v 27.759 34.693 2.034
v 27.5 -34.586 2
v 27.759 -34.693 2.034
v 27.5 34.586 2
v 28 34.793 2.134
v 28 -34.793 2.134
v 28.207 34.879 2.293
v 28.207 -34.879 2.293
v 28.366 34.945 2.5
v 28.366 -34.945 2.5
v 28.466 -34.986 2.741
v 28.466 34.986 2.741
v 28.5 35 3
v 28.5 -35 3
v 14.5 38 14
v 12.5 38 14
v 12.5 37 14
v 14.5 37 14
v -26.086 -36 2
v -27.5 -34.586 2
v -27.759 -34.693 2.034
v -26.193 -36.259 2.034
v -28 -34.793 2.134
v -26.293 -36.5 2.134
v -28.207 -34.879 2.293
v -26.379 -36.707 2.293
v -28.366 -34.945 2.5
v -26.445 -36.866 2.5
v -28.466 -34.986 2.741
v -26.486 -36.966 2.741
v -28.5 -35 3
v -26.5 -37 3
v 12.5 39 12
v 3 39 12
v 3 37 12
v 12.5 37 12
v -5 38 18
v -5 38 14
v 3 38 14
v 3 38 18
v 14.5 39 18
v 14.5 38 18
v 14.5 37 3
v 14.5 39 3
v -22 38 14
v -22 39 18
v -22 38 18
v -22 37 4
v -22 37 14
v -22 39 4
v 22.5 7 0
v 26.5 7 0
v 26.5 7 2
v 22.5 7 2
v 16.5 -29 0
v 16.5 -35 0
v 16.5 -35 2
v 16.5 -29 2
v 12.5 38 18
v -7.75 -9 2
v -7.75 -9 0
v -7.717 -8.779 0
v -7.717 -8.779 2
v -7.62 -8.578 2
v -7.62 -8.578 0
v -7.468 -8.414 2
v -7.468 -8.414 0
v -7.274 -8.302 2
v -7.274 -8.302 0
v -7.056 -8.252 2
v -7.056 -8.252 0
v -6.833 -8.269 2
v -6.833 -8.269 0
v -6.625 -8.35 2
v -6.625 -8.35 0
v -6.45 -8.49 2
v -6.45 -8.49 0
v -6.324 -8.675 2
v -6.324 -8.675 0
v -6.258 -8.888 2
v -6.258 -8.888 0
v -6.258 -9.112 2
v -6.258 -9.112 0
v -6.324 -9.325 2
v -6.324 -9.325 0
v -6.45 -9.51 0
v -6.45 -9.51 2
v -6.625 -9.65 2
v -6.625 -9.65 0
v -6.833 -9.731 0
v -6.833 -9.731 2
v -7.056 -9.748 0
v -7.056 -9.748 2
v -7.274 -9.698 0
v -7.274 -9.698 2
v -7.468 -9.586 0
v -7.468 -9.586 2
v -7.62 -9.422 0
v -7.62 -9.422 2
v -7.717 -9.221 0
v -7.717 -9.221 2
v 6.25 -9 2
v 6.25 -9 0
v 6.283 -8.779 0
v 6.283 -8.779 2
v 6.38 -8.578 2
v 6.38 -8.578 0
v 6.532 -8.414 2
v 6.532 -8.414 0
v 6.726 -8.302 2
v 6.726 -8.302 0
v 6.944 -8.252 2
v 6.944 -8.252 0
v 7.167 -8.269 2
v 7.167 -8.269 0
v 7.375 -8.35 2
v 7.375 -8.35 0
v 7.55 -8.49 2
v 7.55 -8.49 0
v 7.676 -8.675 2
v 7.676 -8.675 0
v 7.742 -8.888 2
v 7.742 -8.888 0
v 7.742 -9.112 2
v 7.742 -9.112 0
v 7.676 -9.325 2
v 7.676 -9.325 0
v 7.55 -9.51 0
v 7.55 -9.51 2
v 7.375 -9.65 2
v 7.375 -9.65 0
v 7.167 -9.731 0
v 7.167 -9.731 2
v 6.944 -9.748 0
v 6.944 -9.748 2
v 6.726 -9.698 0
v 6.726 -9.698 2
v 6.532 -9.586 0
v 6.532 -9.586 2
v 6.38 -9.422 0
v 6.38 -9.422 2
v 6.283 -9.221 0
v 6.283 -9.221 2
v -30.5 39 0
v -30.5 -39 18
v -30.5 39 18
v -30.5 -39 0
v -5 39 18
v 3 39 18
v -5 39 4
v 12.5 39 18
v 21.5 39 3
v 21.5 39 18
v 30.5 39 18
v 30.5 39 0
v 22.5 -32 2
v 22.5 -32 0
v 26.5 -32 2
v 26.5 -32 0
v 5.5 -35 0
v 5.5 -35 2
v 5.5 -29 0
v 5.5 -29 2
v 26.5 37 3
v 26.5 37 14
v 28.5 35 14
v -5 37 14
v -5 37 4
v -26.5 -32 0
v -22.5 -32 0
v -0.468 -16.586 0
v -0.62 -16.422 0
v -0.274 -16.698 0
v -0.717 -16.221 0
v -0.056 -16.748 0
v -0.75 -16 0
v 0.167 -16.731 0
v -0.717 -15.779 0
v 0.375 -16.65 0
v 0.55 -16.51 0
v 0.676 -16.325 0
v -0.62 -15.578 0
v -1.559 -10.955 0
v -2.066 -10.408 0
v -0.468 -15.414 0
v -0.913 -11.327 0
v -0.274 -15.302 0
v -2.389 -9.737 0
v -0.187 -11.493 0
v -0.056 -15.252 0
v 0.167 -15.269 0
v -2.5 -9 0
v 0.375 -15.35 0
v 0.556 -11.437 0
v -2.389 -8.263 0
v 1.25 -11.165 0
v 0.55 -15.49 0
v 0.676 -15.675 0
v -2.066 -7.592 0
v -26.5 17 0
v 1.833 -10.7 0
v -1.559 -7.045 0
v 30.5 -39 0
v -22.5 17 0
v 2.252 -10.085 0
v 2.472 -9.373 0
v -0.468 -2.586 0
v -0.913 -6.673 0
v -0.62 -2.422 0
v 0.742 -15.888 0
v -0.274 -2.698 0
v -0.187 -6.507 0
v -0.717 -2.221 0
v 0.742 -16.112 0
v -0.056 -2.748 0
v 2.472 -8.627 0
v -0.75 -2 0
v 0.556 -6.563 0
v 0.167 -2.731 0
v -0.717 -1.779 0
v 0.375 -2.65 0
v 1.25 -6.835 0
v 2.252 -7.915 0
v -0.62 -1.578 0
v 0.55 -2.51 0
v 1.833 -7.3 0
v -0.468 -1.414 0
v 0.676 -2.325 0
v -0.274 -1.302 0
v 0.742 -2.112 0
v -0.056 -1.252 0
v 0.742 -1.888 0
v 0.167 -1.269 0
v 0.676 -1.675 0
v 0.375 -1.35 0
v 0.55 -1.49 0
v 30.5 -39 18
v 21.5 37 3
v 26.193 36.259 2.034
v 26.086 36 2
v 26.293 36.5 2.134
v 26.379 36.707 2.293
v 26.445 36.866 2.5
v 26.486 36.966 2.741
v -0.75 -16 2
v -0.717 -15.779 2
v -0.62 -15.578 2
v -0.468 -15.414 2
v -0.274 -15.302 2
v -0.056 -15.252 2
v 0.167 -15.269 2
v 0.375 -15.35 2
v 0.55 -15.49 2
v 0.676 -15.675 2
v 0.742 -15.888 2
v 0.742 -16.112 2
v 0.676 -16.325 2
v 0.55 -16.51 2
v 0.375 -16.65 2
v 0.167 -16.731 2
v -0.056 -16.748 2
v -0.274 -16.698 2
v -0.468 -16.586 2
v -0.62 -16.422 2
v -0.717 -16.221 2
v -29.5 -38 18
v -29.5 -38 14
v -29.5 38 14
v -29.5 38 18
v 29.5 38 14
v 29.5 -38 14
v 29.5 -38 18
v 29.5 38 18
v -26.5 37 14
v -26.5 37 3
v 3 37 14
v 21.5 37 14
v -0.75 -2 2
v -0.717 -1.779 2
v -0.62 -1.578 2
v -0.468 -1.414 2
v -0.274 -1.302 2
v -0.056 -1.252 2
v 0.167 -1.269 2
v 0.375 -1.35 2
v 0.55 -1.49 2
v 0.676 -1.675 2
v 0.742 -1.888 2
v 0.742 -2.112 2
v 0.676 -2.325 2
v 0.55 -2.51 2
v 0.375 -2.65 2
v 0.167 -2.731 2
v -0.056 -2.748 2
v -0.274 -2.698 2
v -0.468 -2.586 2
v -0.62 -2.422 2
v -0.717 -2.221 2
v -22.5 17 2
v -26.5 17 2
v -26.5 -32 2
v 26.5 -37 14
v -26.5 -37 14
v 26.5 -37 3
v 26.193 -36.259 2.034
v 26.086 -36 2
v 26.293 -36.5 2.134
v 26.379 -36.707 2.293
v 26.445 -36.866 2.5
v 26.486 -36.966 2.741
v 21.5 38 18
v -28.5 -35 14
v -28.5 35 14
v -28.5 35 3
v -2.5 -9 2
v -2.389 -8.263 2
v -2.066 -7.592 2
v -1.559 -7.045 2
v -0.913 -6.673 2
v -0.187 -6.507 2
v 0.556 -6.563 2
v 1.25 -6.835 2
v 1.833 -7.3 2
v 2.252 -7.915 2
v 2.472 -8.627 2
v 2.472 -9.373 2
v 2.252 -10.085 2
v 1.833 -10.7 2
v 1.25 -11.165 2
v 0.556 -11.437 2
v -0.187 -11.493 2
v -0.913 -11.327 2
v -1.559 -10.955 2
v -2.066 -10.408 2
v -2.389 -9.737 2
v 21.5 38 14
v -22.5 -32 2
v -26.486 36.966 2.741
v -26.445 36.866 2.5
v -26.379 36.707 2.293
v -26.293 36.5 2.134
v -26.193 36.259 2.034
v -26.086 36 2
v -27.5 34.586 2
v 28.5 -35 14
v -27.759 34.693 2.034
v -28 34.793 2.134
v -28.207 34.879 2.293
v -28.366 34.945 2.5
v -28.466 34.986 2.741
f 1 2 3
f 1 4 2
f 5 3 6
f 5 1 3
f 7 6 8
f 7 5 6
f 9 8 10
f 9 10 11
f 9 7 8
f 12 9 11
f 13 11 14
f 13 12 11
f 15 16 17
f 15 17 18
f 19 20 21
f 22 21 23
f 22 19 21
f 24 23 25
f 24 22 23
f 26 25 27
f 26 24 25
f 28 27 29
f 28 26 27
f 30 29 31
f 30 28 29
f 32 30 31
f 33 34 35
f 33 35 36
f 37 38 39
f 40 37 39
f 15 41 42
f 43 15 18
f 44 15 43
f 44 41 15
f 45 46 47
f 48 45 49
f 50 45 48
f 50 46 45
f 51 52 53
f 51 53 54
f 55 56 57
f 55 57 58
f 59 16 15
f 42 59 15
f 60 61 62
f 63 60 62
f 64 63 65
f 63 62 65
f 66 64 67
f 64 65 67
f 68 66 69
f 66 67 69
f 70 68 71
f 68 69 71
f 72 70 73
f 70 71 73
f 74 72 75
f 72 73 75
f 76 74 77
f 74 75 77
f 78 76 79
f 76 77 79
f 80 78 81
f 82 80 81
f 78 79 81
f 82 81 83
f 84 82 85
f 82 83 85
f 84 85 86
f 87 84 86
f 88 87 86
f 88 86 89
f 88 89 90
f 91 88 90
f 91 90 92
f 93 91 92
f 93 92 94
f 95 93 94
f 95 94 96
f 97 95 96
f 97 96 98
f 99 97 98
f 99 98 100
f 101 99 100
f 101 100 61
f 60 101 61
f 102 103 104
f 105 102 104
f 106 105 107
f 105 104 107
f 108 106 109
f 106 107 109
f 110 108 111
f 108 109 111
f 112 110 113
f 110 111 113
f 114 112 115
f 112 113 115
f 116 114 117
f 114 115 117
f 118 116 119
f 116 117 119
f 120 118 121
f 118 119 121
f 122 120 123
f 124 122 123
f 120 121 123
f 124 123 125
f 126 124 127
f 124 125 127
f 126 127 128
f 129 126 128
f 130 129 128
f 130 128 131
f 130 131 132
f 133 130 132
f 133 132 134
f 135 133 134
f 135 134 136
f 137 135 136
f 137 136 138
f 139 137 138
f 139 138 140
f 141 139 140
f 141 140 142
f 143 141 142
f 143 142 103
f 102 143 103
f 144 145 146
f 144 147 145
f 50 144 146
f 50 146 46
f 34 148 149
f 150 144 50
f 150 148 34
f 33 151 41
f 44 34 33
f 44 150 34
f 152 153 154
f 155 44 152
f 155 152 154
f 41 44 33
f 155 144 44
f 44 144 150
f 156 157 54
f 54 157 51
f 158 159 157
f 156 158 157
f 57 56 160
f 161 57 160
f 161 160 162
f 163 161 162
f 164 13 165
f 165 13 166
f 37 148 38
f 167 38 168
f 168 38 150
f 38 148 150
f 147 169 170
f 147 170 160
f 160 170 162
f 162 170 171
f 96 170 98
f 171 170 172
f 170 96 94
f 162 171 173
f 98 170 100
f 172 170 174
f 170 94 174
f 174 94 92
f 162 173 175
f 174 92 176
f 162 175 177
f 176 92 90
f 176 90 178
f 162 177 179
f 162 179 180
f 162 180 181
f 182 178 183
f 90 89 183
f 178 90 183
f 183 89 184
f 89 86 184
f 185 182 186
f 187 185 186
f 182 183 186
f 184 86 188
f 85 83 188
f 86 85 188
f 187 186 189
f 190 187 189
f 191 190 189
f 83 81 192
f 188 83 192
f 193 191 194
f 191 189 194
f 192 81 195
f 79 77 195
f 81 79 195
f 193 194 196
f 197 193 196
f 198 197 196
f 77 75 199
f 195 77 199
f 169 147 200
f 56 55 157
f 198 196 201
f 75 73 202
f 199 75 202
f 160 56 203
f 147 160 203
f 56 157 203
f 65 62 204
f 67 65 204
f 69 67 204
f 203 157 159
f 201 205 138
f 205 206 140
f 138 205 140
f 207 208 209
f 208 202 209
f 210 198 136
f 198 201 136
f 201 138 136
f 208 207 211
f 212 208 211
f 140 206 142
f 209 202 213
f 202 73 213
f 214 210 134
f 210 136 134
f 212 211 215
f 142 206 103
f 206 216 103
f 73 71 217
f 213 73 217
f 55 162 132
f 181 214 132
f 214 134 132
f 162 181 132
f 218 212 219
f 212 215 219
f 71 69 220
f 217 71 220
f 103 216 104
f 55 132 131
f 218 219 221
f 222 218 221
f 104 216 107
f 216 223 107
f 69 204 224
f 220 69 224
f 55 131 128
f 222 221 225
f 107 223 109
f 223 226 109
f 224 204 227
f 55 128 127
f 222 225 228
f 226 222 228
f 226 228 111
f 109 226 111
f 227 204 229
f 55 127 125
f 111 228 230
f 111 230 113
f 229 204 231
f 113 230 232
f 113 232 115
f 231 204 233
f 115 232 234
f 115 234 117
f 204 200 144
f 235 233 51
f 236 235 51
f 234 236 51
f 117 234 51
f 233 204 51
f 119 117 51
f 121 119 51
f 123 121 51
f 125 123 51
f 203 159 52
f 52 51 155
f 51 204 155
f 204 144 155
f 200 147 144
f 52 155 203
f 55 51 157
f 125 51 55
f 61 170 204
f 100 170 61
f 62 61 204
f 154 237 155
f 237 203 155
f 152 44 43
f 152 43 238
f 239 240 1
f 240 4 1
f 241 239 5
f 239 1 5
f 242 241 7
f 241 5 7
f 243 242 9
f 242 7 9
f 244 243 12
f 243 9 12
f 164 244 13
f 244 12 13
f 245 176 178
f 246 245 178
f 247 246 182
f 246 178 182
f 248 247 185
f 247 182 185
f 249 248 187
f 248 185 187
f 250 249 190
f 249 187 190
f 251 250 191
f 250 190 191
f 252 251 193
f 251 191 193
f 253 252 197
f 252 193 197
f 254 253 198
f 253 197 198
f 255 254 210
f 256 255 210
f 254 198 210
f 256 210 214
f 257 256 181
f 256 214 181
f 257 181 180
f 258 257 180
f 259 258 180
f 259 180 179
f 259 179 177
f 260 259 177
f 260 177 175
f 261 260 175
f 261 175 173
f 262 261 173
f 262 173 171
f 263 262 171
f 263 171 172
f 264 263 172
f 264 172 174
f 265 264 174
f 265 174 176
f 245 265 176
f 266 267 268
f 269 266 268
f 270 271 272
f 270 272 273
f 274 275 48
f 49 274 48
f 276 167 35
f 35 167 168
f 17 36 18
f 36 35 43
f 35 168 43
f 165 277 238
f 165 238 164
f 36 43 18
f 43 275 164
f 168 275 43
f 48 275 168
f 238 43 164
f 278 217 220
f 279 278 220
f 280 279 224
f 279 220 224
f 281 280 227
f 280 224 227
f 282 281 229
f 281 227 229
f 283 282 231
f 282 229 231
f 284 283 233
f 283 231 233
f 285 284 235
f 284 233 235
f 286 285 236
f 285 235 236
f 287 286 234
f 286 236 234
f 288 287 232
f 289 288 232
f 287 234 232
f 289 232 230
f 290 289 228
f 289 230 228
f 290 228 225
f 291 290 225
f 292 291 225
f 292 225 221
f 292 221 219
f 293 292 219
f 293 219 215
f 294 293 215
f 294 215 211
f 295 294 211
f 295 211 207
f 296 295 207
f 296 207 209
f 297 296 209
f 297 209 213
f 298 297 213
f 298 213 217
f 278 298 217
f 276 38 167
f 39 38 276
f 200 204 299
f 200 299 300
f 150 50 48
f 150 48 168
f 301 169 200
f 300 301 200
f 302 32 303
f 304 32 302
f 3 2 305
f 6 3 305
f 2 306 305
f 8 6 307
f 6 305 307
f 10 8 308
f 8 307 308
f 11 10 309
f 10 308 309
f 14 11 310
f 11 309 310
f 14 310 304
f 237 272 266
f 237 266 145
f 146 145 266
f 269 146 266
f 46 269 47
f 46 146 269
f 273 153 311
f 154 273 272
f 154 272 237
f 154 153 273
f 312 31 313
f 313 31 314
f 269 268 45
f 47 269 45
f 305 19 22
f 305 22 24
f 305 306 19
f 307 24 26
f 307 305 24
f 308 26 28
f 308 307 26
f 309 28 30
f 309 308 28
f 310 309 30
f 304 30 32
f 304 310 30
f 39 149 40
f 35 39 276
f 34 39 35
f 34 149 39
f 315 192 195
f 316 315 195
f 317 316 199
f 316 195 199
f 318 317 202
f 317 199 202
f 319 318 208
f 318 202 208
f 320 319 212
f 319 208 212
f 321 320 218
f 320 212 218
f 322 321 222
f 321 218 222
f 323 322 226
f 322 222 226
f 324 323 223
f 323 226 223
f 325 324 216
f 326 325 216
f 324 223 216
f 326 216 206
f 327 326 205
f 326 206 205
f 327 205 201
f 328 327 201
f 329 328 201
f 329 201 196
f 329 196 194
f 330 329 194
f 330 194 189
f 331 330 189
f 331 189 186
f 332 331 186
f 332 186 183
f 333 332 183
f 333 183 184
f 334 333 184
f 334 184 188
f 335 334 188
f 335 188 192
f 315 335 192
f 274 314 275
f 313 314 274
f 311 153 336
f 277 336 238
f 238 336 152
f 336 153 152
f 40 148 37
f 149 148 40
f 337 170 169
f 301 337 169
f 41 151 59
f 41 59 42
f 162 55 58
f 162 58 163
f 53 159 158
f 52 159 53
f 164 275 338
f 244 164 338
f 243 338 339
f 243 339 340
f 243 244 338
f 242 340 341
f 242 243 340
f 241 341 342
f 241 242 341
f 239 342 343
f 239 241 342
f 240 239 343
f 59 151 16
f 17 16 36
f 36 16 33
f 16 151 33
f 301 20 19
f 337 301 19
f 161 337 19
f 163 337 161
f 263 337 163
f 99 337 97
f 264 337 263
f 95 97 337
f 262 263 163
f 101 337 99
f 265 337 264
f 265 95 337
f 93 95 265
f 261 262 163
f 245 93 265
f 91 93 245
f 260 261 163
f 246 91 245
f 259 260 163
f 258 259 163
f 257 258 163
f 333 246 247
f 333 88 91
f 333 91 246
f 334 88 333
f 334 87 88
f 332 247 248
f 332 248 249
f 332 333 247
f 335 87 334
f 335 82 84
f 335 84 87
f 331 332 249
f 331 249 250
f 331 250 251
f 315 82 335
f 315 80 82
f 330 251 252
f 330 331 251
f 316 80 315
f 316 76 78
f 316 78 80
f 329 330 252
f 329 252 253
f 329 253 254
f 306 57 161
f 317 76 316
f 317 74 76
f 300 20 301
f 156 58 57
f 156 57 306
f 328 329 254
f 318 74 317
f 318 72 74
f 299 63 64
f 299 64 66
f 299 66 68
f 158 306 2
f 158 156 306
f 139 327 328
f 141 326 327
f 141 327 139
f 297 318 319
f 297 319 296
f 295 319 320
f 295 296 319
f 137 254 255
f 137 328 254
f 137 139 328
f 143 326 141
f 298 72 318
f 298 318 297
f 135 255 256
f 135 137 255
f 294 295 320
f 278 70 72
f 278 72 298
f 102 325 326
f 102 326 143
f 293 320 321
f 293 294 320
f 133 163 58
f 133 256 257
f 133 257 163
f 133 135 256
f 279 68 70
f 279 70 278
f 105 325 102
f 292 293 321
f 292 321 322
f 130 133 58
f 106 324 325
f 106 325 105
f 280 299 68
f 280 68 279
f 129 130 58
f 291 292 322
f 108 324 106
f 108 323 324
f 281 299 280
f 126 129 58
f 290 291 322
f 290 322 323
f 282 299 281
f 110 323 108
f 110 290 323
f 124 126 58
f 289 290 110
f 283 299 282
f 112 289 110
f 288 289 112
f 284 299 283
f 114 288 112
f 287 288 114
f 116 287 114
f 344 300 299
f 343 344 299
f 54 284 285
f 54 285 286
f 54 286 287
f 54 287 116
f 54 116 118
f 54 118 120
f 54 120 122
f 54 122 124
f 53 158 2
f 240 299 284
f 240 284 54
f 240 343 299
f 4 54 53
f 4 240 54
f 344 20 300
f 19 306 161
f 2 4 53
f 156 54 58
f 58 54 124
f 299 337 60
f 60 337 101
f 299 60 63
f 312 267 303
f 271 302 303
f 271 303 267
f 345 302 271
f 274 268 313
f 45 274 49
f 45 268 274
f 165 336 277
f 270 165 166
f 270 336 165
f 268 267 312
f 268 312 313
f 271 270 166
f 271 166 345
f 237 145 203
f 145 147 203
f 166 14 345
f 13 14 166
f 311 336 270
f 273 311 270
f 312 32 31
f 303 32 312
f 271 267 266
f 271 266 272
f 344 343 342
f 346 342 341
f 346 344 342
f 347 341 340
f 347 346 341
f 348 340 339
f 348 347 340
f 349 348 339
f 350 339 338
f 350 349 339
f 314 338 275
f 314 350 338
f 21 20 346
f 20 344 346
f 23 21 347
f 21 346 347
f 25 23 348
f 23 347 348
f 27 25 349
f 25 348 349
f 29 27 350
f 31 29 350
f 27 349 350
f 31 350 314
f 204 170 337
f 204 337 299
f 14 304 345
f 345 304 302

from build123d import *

# Parameters (mm, degrees)
ESQUISSE1_W             = 61
ESQUISSE1_H             = 78
BOSS_EXTRU_1_DEPTH      = 2
ESQUISSE2_W             = 61
ESQUISSE2_H             = 78
ESQUISSE2_W_2           = 57
ESQUISSE2_H_2           = 74
BOSS_EXTRU_2_DEPTH      = 12
ESQUISSE3_W             = 61
ESQUISSE3_H             = 78
ESQUISSE3_W_2           = 59
ESQUISSE3_H_2           = 76
BOSS_EXTRU_3_DEPTH      = 4
ESQUISSE7_W             = 17
ESQUISSE7_H             = 20.984875374
ESQUISSE7_W_2           = 7
ESQUISSE7_H_2           = 18.09159362
ESQUISSE7_W_3           = 9.5
ESQUISSE7_H_3           = 11.016430182
ENL_V_MAT_EXTRU_2_DEPTH = 3
ENL_V_MAT_EXTRU_3_REACH = 54.681
ESQUISSE8_W             = 4
ESQUISSE8_H             = 39
ESQUISSE8_H_2           = 49
ESQUISSE8_W_2           = 11
ESQUISSE8_H_3           = 6
CHANFREIN1_SIZE         = 2
ENL_V_MAT_EXTRU_4_REACH = 54.681
ESQUISSE9_R             = 2.5
ESQUISSE9_R_2           = 0.75
CONG_1_R                = 1


with BuildPart() as part:
    # Esquisse1 → Boss.-Extru.1 (new body)
    with BuildSketch(Plane.XY):
        Rectangle(ESQUISSE1_W, ESQUISSE1_H)
    extrude(amount=BOSS_EXTRU_1_DEPTH)

    # Esquisse2 → Boss.-Extru.2 (add)
    with BuildSketch(Plane.XY.offset(2)):
        Rectangle(ESQUISSE2_W, ESQUISSE2_H)
        Rectangle(ESQUISSE2_W_2, ESQUISSE2_H_2, mode=Mode.SUBTRACT)
    extrude(amount=BOSS_EXTRU_2_DEPTH)

    # Esquisse3 → Boss.-Extru.3 (add)
    with BuildSketch(Plane.XY.offset(14)):
        Rectangle(ESQUISSE3_W, ESQUISSE3_H)
        Rectangle(ESQUISSE3_W_2, ESQUISSE3_H_2, mode=Mode.SUBTRACT)
    extrude(amount=BOSS_EXTRU_3_DEPTH)

    # Esquisse7 → Enlèv. mat.-Extru.2 (cut)
    with BuildSketch(Plane(origin=(0, 39, 0), x_dir=(1, 0, 0), z_dir=(0, 1, 0))):
        with Locations((-13.5, -14.492437687)):
            Rectangle(ESQUISSE7_W, ESQUISSE7_H)
        with Locations((18, -12.04579681)):
            Rectangle(ESQUISSE7_W_2, ESQUISSE7_H_2)
        with Locations((7.75, -17.508215091)):
            Rectangle(ESQUISSE7_W_3, ESQUISSE7_H_3)
    extrude(amount=-ENL_V_MAT_EXTRU_2_DEPTH, mode=Mode.SUBTRACT)

    # Esquisse8 → Enlèv. mat.-Extru.3 (cut, up to next)
    with BuildSketch(Plane(origin=(0, 0, 0), x_dir=(-1, 0, 0), z_dir=(0, 0, -1)), mode=Mode.PRIVATE) as enl_v_mat_extru_3_sk1:
        with Locations((-24.5, -12.5)):
            Rectangle(ESQUISSE8_W, ESQUISSE8_H)
    enl_v_mat_extru_3_tool1 = extrude(enl_v_mat_extru_3_sk1.sketch, amount=-ENL_V_MAT_EXTRU_3_REACH, mode=Mode.PRIVATE) & part.part
    # Esquisse8 → Enlèv. mat.-Extru.3 (cut, up to next)
    with BuildSketch(Plane(origin=(0, 0, 0), x_dir=(-1, 0, 0), z_dir=(0, 0, -1)), mode=Mode.PRIVATE) as enl_v_mat_extru_3_sk2:
        with Locations((24.5, -7.5)):
            Rectangle(ESQUISSE8_W, ESQUISSE8_H_2)
    enl_v_mat_extru_3_tool2 = extrude(enl_v_mat_extru_3_sk2.sketch, amount=-ENL_V_MAT_EXTRU_3_REACH, mode=Mode.PRIVATE) & part.part
    # Esquisse8 → Enlèv. mat.-Extru.3 (cut, up to next)
    with BuildSketch(Plane(origin=(0, 0, 0), x_dir=(-1, 0, 0), z_dir=(0, 0, -1)), mode=Mode.PRIVATE) as enl_v_mat_extru_3_sk3:
        with Locations((-11, -32)):
            Rectangle(ESQUISSE8_W_2, ESQUISSE8_H_3)
    enl_v_mat_extru_3_tool3 = extrude(enl_v_mat_extru_3_sk3.sketch, amount=-ENL_V_MAT_EXTRU_3_REACH, mode=Mode.PRIVATE) & part.part
    add(enl_v_mat_extru_3_tool1.solids().sort_by_distance((24.5, -12.5, 0))[0], mode=Mode.SUBTRACT)
    add(enl_v_mat_extru_3_tool2.solids().sort_by_distance((-24.5, -7.5, 0))[0], mode=Mode.SUBTRACT)
    add(enl_v_mat_extru_3_tool3.solids().sort_by_distance((11, -32, 0))[0], mode=Mode.SUBTRACT)

    # Chanfrein1
    chanfrein1_edges = [part.edges().sort_by_distance(p)[0] for p in [
        (-28.5, -37, 8),
        (28.5, -37, 8),
        (28.5, 37, 8),
        (-28.5, 37, 8),
    ]]
    chamfer(chanfrein1_edges, length=CHANFREIN1_SIZE)

    # Esquisse9 → Enlèv. mat.-Extru.4 (cut, up to next)
    with BuildSketch(Plane(origin=(0, 0, 0), x_dir=(-1, 0, 0), z_dir=(0, 0, -1)), mode=Mode.PRIVATE) as enl_v_mat_extru_4_sk1:
        with Locations((0, -9)):
            Circle(ESQUISSE9_R)
    enl_v_mat_extru_4_tool1 = extrude(enl_v_mat_extru_4_sk1.sketch, amount=-ENL_V_MAT_EXTRU_4_REACH, mode=Mode.PRIVATE) & part.part
    # Esquisse9 → Enlèv. mat.-Extru.4 (cut, up to next)
    with BuildSketch(Plane(origin=(0, 0, 0), x_dir=(-1, 0, 0), z_dir=(0, 0, -1)), mode=Mode.PRIVATE) as enl_v_mat_extru_4_sk2:
        with Locations((-7, -9)):
            Circle(ESQUISSE9_R_2)
    enl_v_mat_extru_4_tool2 = extrude(enl_v_mat_extru_4_sk2.sketch, amount=-ENL_V_MAT_EXTRU_4_REACH, mode=Mode.PRIVATE) & part.part
    # Esquisse9 → Enlèv. mat.-Extru.4 (cut, up to next)
    with BuildSketch(Plane(origin=(0, 0, 0), x_dir=(-1, 0, 0), z_dir=(0, 0, -1)), mode=Mode.PRIVATE) as enl_v_mat_extru_4_sk3:
        with Locations((7, -9)):
            Circle(ESQUISSE9_R_2)
    enl_v_mat_extru_4_tool3 = extrude(enl_v_mat_extru_4_sk3.sketch, amount=-ENL_V_MAT_EXTRU_4_REACH, mode=Mode.PRIVATE) & part.part
    # Esquisse9 → Enlèv. mat.-Extru.4 (cut, up to next)
    with BuildSketch(Plane(origin=(0, 0, 0), x_dir=(-1, 0, 0), z_dir=(0, 0, -1)), mode=Mode.PRIVATE) as enl_v_mat_extru_4_sk4:
        with Locations((0, -2)):
            Circle(ESQUISSE9_R_2)
    enl_v_mat_extru_4_tool4 = extrude(enl_v_mat_extru_4_sk4.sketch, amount=-ENL_V_MAT_EXTRU_4_REACH, mode=Mode.PRIVATE) & part.part
    # Esquisse9 → Enlèv. mat.-Extru.4 (cut, up to next)
    with BuildSketch(Plane(origin=(0, 0, 0), x_dir=(-1, 0, 0), z_dir=(0, 0, -1)), mode=Mode.PRIVATE) as enl_v_mat_extru_4_sk5:
        with Locations((0, -16)):
            Circle(ESQUISSE9_R_2)
    enl_v_mat_extru_4_tool5 = extrude(enl_v_mat_extru_4_sk5.sketch, amount=-ENL_V_MAT_EXTRU_4_REACH, mode=Mode.PRIVATE) & part.part
    add(enl_v_mat_extru_4_tool1.solids().sort_by_distance((0, -9, 0))[0], mode=Mode.SUBTRACT)
    add(enl_v_mat_extru_4_tool2.solids().sort_by_distance((7, -9, 0))[0], mode=Mode.SUBTRACT)
    add(enl_v_mat_extru_4_tool3.solids().sort_by_distance((-7, -9, 0))[0], mode=Mode.SUBTRACT)
    add(enl_v_mat_extru_4_tool4.solids().sort_by_distance((0, -2, 0))[0], mode=Mode.SUBTRACT)
    add(enl_v_mat_extru_4_tool5.solids().sort_by_distance((0, -16, 0))[0], mode=Mode.SUBTRACT)

    # Congé1
    cong_1_edges = [part.edges().sort_by_distance(p)[0] for p in [
        (0, 37, 2),
        (-28.5, 0, 2),
        (0, -37, 2),
        (28.5, 0, 2),
        (27.5, 36, 2),
        (27.5, -36, 2),
        (-27.5, -36, 2),
        (-27.5, 36, 2),
    ]]
    fillet(cong_1_edges, radius=CONG_1_R - 0.0001)  # a hair under: the kernel refuses the full size


solid = part.part
